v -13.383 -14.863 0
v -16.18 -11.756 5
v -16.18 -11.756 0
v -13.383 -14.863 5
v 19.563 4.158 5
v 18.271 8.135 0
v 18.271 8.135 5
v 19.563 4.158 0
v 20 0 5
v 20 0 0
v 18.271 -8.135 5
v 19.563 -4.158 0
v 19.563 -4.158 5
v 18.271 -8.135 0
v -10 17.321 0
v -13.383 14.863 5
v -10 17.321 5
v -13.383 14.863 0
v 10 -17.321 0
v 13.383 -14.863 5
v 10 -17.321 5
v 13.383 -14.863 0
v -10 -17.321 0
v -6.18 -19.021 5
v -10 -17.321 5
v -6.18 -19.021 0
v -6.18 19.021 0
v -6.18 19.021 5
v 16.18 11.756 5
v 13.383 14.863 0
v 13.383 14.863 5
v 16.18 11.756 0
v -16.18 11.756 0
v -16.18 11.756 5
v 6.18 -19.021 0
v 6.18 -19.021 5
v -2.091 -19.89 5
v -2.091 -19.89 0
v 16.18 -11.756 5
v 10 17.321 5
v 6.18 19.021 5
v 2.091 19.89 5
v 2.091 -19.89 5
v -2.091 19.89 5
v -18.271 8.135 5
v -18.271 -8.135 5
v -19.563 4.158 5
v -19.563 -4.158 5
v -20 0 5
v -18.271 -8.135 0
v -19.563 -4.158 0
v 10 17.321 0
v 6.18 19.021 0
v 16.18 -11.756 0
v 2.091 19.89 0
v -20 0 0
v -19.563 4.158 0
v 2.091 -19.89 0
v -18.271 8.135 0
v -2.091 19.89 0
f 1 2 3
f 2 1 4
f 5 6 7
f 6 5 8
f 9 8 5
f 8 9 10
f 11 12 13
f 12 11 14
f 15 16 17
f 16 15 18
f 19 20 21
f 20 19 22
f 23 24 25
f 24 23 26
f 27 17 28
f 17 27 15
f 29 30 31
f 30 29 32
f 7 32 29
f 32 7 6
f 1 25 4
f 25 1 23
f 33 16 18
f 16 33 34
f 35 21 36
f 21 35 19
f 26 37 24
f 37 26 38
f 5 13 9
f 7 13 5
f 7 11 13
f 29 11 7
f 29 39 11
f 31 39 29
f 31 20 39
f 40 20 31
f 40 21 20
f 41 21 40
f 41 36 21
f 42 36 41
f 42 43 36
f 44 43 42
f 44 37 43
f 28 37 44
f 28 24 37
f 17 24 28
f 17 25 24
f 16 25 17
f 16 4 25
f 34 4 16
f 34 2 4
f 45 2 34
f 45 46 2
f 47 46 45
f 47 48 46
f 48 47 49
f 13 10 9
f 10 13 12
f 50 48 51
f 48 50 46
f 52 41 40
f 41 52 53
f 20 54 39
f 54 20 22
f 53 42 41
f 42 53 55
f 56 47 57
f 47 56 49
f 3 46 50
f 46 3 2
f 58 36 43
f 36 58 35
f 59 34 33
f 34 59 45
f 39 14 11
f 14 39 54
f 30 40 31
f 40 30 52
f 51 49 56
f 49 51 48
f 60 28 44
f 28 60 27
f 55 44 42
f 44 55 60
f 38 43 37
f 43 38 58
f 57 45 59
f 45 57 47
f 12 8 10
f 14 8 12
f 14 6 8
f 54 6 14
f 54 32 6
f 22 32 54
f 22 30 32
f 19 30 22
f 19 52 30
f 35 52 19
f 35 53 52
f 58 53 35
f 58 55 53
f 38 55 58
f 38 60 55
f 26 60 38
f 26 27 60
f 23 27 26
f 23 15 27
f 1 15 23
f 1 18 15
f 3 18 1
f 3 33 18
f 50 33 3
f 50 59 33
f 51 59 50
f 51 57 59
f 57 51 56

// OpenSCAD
module engranaje(dientes, radio, grosor) {
    function angulo(i) = i * 360 / dientes;
    
    difference() {
        cylinder(h=grosor, d=radio*2);
        
        for (i = [0:dientes-1]) {
            rotate([0, 0, angulo(i)])
                translate([radio, 0, 0])
                    circle(5);
        }
    }
}

// Engranaje con 10 dientes
engranaje(10, 20, 5);
